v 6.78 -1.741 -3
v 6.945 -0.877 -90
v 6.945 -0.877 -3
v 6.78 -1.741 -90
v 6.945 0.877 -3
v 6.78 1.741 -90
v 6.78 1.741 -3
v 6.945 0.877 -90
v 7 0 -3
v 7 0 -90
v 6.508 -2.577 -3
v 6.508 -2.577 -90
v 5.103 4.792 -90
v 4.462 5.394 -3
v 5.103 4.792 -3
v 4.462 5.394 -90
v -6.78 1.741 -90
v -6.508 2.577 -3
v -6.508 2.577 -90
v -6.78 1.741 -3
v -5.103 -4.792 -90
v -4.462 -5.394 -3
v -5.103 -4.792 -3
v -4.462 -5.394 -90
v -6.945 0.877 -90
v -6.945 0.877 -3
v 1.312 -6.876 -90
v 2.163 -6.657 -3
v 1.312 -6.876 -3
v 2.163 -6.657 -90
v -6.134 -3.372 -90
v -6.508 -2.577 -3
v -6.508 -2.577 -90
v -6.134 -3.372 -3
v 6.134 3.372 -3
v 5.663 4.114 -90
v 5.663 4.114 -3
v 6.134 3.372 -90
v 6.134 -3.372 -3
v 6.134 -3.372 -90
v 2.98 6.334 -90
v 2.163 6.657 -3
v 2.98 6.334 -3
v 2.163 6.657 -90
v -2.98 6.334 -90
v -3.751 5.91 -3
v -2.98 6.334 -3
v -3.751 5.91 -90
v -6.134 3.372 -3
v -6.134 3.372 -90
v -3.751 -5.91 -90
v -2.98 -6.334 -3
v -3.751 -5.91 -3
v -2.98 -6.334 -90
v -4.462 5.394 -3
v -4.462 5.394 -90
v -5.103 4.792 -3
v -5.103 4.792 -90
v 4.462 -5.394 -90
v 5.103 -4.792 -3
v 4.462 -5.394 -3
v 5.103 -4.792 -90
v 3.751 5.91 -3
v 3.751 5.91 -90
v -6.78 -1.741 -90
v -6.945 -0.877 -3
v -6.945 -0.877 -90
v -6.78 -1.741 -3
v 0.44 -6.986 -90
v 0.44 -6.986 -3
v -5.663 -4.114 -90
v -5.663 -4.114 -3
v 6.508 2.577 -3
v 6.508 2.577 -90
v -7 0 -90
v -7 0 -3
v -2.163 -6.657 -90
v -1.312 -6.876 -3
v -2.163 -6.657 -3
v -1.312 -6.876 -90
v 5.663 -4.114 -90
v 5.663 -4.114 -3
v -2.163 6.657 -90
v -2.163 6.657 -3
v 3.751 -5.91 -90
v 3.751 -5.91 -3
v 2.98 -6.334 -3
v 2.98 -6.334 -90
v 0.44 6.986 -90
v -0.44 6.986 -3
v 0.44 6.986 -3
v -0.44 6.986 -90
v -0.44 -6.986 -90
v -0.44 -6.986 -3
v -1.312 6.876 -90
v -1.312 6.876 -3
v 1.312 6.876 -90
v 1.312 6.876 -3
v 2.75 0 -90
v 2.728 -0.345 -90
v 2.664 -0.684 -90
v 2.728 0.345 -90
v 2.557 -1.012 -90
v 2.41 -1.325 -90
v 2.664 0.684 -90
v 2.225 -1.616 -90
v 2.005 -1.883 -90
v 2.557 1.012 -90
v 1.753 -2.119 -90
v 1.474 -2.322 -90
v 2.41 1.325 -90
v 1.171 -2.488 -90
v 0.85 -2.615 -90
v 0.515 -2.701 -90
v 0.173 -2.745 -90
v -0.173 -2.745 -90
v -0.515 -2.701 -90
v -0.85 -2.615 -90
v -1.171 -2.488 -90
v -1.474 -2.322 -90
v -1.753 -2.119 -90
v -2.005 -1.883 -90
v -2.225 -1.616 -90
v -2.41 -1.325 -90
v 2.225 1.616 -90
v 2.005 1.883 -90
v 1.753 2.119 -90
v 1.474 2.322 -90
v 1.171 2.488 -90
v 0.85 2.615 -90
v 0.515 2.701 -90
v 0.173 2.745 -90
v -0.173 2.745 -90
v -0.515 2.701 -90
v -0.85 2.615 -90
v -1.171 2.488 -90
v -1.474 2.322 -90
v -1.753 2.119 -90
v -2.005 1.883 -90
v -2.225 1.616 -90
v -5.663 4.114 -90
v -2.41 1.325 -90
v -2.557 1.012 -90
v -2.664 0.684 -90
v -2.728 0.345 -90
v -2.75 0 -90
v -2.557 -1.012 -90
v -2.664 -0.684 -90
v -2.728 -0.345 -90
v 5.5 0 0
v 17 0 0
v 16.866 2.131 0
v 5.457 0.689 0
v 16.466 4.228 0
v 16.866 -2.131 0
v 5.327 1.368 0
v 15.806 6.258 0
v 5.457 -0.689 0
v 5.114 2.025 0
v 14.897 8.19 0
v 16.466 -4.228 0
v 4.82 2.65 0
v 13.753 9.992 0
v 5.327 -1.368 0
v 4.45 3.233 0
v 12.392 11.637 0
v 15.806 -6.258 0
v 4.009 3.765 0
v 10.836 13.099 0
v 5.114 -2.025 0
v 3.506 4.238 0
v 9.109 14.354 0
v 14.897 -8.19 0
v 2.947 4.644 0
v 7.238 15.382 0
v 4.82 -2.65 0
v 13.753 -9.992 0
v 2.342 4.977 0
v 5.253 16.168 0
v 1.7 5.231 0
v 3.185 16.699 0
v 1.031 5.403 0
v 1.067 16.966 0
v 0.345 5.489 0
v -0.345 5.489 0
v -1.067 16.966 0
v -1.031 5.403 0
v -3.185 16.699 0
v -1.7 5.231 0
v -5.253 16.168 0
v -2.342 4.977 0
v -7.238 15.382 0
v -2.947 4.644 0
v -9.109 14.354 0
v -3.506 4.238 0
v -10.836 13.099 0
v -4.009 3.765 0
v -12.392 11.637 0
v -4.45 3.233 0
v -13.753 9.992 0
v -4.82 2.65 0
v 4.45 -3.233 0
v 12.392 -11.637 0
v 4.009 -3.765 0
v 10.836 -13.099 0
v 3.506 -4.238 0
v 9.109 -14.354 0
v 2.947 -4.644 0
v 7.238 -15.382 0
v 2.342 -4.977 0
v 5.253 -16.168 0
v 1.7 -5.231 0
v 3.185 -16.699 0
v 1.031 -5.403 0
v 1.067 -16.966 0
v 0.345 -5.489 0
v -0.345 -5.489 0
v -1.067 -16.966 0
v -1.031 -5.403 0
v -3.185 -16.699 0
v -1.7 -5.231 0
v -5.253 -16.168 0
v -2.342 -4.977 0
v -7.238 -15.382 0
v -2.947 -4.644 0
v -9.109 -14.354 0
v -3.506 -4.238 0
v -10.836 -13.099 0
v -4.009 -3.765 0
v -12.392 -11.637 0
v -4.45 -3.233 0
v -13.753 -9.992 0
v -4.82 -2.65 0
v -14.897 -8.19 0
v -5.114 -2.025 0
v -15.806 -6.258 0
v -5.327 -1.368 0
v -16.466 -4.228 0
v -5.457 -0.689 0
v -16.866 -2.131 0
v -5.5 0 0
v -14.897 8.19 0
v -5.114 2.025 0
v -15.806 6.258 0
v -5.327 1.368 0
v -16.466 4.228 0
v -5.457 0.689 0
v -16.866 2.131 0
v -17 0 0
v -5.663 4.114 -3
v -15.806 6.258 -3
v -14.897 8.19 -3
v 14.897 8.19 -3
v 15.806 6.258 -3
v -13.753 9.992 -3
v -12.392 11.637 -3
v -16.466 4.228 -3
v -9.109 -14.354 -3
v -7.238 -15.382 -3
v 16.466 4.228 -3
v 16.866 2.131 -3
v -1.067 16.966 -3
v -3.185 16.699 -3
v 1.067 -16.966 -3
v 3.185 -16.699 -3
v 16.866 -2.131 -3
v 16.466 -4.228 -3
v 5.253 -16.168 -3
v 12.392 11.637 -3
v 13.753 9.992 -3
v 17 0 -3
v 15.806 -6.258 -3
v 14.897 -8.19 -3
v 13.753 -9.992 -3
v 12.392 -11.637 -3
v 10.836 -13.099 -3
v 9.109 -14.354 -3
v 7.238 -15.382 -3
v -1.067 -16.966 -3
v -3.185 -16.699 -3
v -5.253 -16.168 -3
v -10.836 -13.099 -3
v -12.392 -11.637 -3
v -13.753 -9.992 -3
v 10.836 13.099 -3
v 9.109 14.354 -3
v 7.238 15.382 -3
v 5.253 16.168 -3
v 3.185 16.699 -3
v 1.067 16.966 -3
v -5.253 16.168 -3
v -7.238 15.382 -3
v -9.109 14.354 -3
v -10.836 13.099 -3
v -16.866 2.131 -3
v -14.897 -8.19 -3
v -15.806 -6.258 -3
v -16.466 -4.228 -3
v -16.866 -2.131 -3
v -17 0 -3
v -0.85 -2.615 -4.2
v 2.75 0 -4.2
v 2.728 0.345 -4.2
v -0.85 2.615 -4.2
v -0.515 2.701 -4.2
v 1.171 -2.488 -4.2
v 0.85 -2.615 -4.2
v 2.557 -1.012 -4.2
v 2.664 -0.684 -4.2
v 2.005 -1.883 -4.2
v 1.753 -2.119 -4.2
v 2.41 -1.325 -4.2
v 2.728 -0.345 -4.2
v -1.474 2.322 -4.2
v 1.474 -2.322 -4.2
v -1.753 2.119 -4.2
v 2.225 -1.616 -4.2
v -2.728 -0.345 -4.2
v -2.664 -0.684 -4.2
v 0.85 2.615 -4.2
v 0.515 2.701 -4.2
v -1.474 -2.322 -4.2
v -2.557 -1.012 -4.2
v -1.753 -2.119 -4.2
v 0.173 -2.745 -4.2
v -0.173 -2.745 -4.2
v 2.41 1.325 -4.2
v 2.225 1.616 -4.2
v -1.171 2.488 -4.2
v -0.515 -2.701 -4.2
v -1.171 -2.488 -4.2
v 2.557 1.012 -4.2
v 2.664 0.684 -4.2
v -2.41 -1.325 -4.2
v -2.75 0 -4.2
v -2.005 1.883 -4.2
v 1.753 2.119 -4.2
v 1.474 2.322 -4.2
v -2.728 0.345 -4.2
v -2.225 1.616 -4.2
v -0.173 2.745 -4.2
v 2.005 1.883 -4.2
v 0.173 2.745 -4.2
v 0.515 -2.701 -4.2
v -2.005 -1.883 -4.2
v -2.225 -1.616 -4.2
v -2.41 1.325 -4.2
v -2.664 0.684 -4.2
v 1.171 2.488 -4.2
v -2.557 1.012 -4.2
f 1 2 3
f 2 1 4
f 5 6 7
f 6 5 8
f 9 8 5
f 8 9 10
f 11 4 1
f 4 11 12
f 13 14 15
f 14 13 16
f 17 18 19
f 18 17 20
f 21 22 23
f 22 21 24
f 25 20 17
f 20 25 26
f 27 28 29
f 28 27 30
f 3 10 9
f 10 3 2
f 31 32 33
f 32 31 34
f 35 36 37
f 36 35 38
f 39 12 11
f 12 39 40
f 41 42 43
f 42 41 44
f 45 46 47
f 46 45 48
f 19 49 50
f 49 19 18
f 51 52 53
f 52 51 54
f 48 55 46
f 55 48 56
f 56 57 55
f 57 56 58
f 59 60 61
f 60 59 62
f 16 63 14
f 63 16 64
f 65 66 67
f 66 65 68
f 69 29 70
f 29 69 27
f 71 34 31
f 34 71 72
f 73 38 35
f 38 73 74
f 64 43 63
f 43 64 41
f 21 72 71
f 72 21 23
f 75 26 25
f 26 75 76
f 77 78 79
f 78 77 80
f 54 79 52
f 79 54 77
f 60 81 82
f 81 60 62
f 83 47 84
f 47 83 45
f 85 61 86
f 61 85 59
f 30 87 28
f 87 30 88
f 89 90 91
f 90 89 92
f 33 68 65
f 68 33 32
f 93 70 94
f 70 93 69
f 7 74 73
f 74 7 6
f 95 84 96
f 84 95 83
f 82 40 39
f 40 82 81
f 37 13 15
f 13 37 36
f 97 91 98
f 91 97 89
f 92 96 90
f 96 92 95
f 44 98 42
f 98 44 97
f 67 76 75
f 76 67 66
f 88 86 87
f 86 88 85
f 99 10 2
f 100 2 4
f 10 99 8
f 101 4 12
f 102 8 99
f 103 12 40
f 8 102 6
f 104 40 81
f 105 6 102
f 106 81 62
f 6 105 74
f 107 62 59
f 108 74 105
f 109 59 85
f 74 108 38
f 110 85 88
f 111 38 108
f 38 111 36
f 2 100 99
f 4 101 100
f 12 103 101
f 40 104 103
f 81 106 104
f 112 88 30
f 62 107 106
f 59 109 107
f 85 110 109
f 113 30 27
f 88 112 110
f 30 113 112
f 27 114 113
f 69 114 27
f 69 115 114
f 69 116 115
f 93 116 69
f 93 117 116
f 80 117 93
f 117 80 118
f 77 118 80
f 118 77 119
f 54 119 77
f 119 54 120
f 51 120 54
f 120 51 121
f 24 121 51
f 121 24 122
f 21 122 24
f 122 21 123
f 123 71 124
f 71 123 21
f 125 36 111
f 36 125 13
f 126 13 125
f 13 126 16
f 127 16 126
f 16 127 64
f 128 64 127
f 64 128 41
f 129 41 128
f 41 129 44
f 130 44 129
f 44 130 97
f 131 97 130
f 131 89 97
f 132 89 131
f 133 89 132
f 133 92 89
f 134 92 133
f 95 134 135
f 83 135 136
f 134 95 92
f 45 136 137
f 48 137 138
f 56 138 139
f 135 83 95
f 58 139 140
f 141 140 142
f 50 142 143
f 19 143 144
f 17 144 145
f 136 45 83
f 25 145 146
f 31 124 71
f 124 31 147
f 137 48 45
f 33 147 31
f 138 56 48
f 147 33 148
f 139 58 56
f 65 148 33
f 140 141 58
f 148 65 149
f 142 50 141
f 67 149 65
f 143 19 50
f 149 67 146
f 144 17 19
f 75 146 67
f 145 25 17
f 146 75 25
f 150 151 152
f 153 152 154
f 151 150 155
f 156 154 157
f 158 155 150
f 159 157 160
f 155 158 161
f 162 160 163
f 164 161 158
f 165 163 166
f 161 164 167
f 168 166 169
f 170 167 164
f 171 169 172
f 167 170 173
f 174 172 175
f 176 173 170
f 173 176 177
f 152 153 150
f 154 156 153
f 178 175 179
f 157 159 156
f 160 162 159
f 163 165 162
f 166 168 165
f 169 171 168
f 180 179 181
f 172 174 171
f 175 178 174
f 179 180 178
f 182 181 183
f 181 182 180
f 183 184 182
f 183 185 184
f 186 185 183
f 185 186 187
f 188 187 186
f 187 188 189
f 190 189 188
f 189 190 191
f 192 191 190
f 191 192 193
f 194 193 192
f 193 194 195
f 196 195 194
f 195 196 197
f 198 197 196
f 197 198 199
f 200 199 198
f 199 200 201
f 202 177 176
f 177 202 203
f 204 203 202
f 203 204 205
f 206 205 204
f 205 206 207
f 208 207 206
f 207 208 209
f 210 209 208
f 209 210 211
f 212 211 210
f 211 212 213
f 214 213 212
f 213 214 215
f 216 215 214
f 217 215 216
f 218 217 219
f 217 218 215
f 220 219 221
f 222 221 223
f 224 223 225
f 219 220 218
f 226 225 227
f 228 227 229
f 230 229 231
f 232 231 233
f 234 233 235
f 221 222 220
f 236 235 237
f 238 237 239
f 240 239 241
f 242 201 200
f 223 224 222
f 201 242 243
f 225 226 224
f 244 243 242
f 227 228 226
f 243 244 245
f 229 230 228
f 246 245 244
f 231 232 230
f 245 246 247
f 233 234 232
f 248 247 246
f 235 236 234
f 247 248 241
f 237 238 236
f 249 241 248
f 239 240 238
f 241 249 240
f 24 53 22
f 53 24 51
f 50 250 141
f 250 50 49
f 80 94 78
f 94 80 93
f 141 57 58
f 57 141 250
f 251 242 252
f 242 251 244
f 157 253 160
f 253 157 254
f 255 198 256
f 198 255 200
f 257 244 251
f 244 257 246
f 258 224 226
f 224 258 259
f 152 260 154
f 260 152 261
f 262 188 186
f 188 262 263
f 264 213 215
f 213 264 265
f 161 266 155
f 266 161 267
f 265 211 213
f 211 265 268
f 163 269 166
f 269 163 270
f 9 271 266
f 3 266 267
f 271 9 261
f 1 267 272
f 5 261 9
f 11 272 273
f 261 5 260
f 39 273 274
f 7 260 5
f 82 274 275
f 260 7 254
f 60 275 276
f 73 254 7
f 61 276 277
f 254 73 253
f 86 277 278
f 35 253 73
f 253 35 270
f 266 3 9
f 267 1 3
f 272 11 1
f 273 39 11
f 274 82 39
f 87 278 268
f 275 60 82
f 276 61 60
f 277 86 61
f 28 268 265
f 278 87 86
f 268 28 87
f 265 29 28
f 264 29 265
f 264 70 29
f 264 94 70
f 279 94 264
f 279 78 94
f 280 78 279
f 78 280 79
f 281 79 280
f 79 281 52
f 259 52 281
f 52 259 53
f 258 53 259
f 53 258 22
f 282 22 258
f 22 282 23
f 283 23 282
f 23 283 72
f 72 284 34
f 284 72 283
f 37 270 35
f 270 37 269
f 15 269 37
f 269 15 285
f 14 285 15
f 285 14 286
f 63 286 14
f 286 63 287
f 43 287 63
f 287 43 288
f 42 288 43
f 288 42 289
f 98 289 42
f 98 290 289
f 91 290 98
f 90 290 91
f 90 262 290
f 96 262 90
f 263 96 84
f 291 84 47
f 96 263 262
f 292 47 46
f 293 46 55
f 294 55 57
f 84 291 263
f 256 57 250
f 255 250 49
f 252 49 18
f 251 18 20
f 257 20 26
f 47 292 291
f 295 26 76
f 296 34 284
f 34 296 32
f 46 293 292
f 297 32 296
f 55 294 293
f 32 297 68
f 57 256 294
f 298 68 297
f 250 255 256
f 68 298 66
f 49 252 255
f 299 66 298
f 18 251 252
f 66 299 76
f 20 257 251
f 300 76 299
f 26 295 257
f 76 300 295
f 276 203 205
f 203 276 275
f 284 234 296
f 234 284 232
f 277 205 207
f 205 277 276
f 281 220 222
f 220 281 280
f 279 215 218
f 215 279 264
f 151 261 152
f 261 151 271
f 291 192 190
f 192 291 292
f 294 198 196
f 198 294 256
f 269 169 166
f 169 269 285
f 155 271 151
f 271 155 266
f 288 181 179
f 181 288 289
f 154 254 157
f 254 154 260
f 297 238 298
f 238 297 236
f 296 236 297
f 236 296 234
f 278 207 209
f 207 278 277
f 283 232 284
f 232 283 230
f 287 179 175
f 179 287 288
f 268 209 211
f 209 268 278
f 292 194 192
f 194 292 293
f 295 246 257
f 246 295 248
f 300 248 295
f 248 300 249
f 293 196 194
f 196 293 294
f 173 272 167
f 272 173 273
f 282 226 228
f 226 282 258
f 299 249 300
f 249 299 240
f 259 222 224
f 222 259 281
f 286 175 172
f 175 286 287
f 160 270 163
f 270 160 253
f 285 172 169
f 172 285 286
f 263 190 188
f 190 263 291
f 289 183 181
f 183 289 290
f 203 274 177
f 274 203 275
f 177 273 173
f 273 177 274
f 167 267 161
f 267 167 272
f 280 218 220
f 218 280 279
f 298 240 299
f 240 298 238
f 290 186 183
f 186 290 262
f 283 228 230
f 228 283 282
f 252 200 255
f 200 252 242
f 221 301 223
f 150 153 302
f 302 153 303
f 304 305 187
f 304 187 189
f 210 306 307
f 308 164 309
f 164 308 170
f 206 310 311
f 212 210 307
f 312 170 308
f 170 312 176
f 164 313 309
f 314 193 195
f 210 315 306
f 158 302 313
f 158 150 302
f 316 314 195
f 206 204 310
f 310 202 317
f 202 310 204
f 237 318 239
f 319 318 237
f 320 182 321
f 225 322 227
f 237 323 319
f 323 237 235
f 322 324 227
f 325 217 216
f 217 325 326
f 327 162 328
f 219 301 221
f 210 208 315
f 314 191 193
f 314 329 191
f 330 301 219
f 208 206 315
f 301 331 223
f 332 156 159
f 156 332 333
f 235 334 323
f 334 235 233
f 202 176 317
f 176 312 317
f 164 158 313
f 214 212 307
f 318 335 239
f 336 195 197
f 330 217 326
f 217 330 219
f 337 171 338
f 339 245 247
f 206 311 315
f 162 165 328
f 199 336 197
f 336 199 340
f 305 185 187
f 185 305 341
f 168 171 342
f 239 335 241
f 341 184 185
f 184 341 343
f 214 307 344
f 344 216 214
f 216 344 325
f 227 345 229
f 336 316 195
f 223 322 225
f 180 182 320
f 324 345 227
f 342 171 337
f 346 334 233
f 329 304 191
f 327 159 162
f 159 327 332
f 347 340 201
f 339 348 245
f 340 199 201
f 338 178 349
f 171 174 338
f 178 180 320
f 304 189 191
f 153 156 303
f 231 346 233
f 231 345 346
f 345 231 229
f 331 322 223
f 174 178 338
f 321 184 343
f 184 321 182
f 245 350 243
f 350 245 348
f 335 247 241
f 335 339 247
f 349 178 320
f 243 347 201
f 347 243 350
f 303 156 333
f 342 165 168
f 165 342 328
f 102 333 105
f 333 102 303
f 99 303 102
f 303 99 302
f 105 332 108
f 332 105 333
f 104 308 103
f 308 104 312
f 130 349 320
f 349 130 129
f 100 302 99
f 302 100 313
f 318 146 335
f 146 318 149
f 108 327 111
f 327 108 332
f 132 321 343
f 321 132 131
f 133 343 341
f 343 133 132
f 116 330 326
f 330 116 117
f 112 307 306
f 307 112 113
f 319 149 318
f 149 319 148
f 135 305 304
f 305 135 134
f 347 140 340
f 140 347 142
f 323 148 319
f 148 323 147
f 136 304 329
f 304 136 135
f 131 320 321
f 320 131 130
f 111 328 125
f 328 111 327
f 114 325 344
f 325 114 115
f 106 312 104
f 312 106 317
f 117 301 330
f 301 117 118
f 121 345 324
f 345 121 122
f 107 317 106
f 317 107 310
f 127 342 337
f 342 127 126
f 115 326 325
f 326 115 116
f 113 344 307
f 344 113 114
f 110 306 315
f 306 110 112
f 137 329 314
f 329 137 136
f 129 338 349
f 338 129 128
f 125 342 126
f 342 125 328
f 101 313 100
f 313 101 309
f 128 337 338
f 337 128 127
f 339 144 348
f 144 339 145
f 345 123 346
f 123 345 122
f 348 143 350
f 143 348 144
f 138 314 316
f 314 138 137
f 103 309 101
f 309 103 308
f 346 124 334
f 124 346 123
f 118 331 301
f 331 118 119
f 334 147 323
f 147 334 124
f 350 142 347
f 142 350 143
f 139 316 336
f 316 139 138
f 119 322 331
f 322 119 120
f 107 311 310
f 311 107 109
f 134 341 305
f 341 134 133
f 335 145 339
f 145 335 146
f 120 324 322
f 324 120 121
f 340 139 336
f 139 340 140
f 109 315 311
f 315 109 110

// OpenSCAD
$fn = 50;


difference() {
	union() {
		translate(v = [0, 0, -90.0000000000]) {
			cylinder(h = 90, r = 7.0000000000);
		}
		translate(v = [0, 0, -3.0000000000]) {
			cylinder(h = 3, r = 17.0000000000);
		}
	}
	union() {
		translate(v = [0, 0, 0]) {
			rotate(a = [0, 0, 0]) {
				difference() {
					union() {
						#translate(v = [0, 0, -90.0000000000]) {
							cylinder(h = 90, r = 2.2500000000);
						}
						#translate(v = [0, 0, -4.2000000000]) {
							cylinder(h = 4.2000000000, r = 7.0000000000, r1 = 2.7500000000, r2 = 5.5000000000);
						}
						#translate(v = [0, 0, -90.0000000000]) {
							cylinder(h = 90, r = 2.7500000000);
						}
						#translate(v = [0, 0, -90.0000000000]) {
							cylinder(h = 90, r = 2.2500000000);
						}
					}
					union();
				}
			}
		}
	}
}
